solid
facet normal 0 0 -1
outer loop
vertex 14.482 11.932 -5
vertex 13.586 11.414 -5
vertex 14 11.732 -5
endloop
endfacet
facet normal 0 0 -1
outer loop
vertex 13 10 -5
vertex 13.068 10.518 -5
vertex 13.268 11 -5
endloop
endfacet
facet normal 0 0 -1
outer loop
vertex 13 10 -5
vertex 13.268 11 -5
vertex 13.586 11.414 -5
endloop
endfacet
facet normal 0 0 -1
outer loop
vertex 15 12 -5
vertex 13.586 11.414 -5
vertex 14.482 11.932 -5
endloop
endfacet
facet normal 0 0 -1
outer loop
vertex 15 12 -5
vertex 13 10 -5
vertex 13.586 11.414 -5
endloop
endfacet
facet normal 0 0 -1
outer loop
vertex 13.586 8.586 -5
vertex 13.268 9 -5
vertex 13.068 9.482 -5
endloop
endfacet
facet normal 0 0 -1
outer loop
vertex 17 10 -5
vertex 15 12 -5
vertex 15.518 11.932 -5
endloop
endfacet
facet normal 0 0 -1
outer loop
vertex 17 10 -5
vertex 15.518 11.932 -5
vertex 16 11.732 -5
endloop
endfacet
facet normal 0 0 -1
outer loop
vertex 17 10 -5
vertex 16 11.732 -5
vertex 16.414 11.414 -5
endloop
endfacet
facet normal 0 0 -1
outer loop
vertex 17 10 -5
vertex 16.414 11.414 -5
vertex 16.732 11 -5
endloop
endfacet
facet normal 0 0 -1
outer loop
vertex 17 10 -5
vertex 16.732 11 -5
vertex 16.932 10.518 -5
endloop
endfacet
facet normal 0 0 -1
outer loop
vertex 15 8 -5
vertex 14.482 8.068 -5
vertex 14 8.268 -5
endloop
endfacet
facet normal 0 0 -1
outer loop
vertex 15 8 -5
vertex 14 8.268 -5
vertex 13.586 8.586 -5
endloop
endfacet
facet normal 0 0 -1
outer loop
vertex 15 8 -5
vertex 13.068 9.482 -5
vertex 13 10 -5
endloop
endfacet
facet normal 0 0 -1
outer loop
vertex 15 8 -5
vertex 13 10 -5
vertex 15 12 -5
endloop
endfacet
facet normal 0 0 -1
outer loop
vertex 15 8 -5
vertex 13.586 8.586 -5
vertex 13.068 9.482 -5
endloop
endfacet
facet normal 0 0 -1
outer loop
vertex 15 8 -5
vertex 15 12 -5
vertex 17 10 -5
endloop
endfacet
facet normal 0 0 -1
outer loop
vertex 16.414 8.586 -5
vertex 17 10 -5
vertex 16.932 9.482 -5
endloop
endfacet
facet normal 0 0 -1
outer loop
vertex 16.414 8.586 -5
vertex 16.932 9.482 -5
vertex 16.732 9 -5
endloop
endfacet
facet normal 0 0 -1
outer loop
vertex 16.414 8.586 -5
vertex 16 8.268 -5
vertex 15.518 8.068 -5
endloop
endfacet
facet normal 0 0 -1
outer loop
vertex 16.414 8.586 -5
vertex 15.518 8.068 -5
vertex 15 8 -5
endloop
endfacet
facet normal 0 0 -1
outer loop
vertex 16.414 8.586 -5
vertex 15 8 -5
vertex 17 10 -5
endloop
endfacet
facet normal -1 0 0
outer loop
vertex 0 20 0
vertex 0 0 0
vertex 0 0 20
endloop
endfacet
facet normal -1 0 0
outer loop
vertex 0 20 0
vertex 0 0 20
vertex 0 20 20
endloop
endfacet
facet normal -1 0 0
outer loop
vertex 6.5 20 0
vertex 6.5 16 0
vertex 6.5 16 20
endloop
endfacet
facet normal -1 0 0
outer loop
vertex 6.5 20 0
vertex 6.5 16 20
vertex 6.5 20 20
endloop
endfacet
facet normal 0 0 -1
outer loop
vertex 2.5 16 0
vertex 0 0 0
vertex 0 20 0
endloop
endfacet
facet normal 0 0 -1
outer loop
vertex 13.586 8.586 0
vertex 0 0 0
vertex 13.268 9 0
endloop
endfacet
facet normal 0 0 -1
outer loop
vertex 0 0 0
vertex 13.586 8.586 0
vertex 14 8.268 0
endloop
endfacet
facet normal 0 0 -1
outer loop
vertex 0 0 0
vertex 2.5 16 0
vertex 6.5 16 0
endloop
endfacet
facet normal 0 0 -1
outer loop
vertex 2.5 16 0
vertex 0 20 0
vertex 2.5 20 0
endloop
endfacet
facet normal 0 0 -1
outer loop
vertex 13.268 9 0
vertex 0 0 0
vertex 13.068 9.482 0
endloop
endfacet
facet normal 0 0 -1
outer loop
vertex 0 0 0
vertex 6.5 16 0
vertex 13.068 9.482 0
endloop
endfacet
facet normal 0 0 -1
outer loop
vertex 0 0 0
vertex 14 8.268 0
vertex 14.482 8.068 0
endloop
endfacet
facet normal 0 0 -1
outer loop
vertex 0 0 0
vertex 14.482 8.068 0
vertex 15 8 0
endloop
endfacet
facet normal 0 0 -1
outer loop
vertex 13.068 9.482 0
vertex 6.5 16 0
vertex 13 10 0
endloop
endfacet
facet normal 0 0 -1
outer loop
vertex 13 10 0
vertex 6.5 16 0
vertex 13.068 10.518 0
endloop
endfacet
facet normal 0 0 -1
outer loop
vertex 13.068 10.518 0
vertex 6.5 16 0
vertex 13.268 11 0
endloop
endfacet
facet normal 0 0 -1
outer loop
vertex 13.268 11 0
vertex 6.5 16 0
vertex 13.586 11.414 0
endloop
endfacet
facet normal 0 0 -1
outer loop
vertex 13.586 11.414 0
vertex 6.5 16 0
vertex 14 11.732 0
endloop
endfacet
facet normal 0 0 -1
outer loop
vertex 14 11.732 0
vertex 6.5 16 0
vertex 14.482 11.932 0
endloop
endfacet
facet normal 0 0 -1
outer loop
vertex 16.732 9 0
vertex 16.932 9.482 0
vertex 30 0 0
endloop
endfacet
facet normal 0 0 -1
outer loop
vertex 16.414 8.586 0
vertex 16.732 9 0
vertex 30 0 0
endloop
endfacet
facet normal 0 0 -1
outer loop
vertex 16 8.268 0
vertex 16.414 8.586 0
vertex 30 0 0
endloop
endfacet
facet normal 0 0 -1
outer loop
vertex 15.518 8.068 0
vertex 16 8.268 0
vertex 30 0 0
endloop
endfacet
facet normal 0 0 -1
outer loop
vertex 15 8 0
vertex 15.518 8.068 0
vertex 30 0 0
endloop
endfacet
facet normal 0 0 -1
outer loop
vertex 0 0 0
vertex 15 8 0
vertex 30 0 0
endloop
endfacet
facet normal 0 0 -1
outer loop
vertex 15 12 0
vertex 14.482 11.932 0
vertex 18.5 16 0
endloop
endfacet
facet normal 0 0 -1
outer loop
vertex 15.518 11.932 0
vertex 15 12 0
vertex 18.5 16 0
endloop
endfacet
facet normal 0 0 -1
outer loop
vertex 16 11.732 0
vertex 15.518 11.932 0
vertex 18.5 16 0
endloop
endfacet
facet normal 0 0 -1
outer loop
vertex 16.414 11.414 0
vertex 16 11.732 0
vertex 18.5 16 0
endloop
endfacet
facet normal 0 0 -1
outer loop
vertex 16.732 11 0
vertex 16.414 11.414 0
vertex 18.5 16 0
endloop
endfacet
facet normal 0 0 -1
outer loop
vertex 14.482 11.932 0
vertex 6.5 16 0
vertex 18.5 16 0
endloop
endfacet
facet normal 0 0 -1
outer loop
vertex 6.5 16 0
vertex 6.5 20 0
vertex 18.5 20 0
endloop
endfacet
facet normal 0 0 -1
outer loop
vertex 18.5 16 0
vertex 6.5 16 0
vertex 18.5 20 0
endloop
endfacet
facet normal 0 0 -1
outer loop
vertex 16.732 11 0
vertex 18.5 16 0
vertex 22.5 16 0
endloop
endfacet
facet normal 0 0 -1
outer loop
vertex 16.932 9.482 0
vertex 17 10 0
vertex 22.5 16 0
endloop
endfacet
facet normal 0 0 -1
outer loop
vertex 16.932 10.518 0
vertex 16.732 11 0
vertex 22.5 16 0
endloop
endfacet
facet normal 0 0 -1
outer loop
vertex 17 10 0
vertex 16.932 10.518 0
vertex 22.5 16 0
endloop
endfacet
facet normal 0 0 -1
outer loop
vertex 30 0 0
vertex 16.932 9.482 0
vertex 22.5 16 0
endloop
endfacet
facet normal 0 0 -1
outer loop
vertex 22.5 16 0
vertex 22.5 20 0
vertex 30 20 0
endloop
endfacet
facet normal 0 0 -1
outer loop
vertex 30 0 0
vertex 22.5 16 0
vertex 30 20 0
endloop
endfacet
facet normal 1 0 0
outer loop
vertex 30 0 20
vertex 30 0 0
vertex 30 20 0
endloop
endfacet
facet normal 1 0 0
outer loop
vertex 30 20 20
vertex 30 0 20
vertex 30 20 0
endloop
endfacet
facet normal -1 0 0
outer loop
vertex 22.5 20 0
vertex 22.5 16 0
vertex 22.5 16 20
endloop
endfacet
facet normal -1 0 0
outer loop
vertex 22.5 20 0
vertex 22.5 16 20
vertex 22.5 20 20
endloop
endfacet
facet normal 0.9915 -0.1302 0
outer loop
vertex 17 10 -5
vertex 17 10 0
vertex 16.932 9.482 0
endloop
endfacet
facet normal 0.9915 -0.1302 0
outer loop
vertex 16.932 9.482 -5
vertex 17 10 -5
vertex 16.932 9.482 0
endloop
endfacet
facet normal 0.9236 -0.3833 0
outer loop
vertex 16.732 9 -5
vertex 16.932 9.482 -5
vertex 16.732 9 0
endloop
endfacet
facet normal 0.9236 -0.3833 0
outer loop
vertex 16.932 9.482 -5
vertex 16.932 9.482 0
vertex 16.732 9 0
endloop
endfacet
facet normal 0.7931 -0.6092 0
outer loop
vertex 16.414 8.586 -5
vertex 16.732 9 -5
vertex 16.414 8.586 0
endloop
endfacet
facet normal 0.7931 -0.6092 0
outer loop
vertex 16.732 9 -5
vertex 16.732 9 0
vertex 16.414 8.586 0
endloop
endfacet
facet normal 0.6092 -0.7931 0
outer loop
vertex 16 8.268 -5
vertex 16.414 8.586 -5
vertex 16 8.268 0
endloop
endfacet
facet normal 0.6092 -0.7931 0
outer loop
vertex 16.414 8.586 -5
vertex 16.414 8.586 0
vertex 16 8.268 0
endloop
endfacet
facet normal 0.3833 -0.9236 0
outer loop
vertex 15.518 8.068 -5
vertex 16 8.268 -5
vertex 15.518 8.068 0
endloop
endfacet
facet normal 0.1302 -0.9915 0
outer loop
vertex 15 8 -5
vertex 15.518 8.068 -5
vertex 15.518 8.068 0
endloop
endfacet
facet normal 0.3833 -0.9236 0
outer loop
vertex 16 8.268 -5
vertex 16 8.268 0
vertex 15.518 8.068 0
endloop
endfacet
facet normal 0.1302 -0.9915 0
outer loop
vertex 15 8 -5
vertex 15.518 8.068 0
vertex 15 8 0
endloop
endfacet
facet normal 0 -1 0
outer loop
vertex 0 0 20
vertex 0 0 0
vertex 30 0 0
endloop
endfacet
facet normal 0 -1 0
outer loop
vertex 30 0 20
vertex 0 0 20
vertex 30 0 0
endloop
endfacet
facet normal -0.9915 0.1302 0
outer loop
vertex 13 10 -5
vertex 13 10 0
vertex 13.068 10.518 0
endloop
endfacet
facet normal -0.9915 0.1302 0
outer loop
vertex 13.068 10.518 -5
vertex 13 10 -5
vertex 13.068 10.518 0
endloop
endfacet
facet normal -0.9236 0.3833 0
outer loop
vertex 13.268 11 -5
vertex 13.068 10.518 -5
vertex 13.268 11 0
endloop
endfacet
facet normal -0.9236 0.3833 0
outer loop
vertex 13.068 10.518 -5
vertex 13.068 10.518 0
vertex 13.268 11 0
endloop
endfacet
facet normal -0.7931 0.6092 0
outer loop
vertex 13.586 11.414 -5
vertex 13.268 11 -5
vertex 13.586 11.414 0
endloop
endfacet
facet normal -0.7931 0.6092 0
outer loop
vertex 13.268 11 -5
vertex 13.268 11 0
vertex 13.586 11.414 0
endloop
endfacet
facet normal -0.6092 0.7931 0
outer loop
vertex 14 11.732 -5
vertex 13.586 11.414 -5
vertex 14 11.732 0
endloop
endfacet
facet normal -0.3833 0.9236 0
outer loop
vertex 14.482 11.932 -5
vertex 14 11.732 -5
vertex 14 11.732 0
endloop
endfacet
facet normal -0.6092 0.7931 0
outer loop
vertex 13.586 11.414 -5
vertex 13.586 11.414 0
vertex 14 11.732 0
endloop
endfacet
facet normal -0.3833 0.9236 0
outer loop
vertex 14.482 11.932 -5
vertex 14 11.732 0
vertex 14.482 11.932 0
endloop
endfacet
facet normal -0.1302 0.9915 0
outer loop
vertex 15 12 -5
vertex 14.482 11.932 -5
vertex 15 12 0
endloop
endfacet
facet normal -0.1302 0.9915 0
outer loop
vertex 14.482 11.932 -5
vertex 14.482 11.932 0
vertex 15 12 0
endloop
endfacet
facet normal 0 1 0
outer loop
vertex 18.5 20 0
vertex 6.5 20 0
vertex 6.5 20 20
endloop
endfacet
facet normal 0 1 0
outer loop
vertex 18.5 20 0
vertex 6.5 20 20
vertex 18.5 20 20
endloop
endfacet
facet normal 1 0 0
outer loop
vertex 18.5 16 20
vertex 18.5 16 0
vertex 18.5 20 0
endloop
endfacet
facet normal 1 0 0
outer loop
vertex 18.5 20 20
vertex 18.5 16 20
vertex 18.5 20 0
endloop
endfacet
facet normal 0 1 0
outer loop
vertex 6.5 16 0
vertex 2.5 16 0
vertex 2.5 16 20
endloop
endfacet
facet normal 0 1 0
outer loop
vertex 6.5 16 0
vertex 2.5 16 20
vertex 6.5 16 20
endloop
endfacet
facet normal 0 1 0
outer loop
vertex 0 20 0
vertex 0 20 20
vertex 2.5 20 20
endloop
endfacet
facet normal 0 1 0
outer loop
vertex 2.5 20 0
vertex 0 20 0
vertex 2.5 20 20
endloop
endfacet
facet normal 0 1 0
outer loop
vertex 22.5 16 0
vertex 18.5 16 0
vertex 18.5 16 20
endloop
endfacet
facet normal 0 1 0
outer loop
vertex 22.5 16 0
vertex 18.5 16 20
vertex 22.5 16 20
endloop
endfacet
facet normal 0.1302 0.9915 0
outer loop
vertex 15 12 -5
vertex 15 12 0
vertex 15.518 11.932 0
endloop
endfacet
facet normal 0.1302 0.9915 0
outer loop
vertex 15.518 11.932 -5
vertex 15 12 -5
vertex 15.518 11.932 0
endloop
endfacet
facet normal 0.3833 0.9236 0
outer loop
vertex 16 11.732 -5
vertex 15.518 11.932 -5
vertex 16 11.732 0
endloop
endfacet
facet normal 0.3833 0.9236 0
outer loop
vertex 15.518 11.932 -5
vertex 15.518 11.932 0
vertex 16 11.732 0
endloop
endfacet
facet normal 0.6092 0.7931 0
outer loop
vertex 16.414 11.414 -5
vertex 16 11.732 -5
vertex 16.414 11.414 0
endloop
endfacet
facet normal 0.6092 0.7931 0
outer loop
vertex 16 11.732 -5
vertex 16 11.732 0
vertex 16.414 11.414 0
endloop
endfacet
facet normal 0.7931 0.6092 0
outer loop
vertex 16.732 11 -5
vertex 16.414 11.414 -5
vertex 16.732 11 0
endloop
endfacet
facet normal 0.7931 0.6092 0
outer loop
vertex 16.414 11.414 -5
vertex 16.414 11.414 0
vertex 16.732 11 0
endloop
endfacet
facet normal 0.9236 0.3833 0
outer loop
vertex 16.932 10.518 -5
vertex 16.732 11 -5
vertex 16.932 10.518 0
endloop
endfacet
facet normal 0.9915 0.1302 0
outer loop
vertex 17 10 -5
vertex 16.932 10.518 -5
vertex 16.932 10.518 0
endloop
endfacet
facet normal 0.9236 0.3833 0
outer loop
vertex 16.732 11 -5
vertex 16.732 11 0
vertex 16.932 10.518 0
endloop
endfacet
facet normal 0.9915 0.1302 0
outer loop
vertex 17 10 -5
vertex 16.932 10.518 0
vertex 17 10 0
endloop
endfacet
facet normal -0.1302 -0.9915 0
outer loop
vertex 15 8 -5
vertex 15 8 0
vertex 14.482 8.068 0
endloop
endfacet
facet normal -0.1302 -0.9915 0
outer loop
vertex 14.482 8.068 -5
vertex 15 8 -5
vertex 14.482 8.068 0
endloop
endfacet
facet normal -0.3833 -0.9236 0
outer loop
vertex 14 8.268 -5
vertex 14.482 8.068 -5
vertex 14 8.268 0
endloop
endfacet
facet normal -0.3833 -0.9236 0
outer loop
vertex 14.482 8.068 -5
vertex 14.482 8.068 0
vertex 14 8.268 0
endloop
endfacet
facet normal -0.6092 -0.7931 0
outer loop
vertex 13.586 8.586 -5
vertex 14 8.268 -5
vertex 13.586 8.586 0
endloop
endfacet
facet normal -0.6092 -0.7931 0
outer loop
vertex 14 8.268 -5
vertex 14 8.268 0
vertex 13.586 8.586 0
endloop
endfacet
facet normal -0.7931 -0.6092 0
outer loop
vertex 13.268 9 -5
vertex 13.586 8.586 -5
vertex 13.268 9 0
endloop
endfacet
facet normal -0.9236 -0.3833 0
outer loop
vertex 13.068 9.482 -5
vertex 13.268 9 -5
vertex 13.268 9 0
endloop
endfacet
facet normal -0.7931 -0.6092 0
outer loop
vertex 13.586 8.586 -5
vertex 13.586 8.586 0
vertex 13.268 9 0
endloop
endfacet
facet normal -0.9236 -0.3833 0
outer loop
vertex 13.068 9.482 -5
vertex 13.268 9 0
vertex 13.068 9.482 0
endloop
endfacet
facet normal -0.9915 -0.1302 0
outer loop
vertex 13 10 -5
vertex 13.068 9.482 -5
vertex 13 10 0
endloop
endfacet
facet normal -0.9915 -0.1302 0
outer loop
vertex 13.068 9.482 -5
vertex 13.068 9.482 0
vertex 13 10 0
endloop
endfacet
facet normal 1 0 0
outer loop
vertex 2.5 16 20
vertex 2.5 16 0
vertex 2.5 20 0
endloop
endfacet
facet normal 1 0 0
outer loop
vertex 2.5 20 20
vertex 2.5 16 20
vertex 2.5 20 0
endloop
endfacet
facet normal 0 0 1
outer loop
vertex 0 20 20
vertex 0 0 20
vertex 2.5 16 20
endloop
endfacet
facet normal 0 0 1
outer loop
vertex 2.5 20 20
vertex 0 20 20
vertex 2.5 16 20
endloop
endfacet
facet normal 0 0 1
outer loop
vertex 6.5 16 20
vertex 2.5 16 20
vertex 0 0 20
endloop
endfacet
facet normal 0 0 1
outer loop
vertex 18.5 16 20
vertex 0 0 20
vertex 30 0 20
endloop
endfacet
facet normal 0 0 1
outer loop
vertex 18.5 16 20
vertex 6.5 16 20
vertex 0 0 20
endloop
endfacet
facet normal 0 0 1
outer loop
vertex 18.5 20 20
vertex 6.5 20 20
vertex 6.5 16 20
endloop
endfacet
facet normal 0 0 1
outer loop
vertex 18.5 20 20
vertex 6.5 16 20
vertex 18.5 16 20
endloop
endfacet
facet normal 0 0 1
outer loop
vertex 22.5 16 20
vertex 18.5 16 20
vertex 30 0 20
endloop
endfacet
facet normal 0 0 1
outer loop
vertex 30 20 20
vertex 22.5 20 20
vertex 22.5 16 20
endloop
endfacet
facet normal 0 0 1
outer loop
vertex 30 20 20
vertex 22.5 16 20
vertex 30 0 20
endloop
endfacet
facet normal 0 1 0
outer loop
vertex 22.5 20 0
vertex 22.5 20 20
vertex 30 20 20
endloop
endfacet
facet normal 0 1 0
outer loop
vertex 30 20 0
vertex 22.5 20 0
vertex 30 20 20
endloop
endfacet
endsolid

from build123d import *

# Parameters (mm, degrees)
F0_W     = 30
F0_H     = 20
F1_DEPTH = 20
F2_W     = 4
F2_H     = 4
F3_DEPTH = 20.001
F5_DEPTH = 5


with BuildPart() as f1:
    # F0 (on Top) → F1 (new body)
    with BuildSketch(Plane.XY):
        with Locations((15, 10)):
            Rectangle(F0_W, F0_H)
    extrude(amount=F1_DEPTH)

    # F2 (on face) → F3 (cut, through all)
    with BuildSketch(Plane.XY.offset(20)):
        with Locations((4.5, 18)):
            Rectangle(F2_W, F2_H)
        with Locations((20.5, 18)):
            Rectangle(F2_W, F2_H)
    extrude(amount=-F3_DEPTH, mode=Mode.SUBTRACT)

    # F4 (on face) → F5 (join)
    with BuildSketch(Plane(origin=(0, 0, 0), x_dir=(1, 0, 0), z_dir=(0, 0, -1))):
        with BuildLine():
            ThreePointArc((15, -8), (13.585786, -8.585786), (13, -10))
            Line((13, -10), (15, -10))
            Line((15, -10), (15, -8))
        make_face()
        with BuildLine():
            Line((15, -10), (13, -10))
            ThreePointArc((13, -10), (13.585786, -11.414214), (15, -12))
            Line((15, -12), (15, -10))
        make_face()
        with BuildLine():
            Line((15, -8), (15, -10))
            Line((15, -10), (17, -10))
            ThreePointArc((17, -10), (16.414214, -8.585786), (15, -8))
        make_face()
        with BuildLine():
            Line((17, -10), (15, -10))
            Line((15, -10), (15, -12))
            ThreePointArc((15, -12), (16.414214, -11.414214), (17, -10))
        make_face()
    extrude(amount=F5_DEPTH)


solid = f1.part
